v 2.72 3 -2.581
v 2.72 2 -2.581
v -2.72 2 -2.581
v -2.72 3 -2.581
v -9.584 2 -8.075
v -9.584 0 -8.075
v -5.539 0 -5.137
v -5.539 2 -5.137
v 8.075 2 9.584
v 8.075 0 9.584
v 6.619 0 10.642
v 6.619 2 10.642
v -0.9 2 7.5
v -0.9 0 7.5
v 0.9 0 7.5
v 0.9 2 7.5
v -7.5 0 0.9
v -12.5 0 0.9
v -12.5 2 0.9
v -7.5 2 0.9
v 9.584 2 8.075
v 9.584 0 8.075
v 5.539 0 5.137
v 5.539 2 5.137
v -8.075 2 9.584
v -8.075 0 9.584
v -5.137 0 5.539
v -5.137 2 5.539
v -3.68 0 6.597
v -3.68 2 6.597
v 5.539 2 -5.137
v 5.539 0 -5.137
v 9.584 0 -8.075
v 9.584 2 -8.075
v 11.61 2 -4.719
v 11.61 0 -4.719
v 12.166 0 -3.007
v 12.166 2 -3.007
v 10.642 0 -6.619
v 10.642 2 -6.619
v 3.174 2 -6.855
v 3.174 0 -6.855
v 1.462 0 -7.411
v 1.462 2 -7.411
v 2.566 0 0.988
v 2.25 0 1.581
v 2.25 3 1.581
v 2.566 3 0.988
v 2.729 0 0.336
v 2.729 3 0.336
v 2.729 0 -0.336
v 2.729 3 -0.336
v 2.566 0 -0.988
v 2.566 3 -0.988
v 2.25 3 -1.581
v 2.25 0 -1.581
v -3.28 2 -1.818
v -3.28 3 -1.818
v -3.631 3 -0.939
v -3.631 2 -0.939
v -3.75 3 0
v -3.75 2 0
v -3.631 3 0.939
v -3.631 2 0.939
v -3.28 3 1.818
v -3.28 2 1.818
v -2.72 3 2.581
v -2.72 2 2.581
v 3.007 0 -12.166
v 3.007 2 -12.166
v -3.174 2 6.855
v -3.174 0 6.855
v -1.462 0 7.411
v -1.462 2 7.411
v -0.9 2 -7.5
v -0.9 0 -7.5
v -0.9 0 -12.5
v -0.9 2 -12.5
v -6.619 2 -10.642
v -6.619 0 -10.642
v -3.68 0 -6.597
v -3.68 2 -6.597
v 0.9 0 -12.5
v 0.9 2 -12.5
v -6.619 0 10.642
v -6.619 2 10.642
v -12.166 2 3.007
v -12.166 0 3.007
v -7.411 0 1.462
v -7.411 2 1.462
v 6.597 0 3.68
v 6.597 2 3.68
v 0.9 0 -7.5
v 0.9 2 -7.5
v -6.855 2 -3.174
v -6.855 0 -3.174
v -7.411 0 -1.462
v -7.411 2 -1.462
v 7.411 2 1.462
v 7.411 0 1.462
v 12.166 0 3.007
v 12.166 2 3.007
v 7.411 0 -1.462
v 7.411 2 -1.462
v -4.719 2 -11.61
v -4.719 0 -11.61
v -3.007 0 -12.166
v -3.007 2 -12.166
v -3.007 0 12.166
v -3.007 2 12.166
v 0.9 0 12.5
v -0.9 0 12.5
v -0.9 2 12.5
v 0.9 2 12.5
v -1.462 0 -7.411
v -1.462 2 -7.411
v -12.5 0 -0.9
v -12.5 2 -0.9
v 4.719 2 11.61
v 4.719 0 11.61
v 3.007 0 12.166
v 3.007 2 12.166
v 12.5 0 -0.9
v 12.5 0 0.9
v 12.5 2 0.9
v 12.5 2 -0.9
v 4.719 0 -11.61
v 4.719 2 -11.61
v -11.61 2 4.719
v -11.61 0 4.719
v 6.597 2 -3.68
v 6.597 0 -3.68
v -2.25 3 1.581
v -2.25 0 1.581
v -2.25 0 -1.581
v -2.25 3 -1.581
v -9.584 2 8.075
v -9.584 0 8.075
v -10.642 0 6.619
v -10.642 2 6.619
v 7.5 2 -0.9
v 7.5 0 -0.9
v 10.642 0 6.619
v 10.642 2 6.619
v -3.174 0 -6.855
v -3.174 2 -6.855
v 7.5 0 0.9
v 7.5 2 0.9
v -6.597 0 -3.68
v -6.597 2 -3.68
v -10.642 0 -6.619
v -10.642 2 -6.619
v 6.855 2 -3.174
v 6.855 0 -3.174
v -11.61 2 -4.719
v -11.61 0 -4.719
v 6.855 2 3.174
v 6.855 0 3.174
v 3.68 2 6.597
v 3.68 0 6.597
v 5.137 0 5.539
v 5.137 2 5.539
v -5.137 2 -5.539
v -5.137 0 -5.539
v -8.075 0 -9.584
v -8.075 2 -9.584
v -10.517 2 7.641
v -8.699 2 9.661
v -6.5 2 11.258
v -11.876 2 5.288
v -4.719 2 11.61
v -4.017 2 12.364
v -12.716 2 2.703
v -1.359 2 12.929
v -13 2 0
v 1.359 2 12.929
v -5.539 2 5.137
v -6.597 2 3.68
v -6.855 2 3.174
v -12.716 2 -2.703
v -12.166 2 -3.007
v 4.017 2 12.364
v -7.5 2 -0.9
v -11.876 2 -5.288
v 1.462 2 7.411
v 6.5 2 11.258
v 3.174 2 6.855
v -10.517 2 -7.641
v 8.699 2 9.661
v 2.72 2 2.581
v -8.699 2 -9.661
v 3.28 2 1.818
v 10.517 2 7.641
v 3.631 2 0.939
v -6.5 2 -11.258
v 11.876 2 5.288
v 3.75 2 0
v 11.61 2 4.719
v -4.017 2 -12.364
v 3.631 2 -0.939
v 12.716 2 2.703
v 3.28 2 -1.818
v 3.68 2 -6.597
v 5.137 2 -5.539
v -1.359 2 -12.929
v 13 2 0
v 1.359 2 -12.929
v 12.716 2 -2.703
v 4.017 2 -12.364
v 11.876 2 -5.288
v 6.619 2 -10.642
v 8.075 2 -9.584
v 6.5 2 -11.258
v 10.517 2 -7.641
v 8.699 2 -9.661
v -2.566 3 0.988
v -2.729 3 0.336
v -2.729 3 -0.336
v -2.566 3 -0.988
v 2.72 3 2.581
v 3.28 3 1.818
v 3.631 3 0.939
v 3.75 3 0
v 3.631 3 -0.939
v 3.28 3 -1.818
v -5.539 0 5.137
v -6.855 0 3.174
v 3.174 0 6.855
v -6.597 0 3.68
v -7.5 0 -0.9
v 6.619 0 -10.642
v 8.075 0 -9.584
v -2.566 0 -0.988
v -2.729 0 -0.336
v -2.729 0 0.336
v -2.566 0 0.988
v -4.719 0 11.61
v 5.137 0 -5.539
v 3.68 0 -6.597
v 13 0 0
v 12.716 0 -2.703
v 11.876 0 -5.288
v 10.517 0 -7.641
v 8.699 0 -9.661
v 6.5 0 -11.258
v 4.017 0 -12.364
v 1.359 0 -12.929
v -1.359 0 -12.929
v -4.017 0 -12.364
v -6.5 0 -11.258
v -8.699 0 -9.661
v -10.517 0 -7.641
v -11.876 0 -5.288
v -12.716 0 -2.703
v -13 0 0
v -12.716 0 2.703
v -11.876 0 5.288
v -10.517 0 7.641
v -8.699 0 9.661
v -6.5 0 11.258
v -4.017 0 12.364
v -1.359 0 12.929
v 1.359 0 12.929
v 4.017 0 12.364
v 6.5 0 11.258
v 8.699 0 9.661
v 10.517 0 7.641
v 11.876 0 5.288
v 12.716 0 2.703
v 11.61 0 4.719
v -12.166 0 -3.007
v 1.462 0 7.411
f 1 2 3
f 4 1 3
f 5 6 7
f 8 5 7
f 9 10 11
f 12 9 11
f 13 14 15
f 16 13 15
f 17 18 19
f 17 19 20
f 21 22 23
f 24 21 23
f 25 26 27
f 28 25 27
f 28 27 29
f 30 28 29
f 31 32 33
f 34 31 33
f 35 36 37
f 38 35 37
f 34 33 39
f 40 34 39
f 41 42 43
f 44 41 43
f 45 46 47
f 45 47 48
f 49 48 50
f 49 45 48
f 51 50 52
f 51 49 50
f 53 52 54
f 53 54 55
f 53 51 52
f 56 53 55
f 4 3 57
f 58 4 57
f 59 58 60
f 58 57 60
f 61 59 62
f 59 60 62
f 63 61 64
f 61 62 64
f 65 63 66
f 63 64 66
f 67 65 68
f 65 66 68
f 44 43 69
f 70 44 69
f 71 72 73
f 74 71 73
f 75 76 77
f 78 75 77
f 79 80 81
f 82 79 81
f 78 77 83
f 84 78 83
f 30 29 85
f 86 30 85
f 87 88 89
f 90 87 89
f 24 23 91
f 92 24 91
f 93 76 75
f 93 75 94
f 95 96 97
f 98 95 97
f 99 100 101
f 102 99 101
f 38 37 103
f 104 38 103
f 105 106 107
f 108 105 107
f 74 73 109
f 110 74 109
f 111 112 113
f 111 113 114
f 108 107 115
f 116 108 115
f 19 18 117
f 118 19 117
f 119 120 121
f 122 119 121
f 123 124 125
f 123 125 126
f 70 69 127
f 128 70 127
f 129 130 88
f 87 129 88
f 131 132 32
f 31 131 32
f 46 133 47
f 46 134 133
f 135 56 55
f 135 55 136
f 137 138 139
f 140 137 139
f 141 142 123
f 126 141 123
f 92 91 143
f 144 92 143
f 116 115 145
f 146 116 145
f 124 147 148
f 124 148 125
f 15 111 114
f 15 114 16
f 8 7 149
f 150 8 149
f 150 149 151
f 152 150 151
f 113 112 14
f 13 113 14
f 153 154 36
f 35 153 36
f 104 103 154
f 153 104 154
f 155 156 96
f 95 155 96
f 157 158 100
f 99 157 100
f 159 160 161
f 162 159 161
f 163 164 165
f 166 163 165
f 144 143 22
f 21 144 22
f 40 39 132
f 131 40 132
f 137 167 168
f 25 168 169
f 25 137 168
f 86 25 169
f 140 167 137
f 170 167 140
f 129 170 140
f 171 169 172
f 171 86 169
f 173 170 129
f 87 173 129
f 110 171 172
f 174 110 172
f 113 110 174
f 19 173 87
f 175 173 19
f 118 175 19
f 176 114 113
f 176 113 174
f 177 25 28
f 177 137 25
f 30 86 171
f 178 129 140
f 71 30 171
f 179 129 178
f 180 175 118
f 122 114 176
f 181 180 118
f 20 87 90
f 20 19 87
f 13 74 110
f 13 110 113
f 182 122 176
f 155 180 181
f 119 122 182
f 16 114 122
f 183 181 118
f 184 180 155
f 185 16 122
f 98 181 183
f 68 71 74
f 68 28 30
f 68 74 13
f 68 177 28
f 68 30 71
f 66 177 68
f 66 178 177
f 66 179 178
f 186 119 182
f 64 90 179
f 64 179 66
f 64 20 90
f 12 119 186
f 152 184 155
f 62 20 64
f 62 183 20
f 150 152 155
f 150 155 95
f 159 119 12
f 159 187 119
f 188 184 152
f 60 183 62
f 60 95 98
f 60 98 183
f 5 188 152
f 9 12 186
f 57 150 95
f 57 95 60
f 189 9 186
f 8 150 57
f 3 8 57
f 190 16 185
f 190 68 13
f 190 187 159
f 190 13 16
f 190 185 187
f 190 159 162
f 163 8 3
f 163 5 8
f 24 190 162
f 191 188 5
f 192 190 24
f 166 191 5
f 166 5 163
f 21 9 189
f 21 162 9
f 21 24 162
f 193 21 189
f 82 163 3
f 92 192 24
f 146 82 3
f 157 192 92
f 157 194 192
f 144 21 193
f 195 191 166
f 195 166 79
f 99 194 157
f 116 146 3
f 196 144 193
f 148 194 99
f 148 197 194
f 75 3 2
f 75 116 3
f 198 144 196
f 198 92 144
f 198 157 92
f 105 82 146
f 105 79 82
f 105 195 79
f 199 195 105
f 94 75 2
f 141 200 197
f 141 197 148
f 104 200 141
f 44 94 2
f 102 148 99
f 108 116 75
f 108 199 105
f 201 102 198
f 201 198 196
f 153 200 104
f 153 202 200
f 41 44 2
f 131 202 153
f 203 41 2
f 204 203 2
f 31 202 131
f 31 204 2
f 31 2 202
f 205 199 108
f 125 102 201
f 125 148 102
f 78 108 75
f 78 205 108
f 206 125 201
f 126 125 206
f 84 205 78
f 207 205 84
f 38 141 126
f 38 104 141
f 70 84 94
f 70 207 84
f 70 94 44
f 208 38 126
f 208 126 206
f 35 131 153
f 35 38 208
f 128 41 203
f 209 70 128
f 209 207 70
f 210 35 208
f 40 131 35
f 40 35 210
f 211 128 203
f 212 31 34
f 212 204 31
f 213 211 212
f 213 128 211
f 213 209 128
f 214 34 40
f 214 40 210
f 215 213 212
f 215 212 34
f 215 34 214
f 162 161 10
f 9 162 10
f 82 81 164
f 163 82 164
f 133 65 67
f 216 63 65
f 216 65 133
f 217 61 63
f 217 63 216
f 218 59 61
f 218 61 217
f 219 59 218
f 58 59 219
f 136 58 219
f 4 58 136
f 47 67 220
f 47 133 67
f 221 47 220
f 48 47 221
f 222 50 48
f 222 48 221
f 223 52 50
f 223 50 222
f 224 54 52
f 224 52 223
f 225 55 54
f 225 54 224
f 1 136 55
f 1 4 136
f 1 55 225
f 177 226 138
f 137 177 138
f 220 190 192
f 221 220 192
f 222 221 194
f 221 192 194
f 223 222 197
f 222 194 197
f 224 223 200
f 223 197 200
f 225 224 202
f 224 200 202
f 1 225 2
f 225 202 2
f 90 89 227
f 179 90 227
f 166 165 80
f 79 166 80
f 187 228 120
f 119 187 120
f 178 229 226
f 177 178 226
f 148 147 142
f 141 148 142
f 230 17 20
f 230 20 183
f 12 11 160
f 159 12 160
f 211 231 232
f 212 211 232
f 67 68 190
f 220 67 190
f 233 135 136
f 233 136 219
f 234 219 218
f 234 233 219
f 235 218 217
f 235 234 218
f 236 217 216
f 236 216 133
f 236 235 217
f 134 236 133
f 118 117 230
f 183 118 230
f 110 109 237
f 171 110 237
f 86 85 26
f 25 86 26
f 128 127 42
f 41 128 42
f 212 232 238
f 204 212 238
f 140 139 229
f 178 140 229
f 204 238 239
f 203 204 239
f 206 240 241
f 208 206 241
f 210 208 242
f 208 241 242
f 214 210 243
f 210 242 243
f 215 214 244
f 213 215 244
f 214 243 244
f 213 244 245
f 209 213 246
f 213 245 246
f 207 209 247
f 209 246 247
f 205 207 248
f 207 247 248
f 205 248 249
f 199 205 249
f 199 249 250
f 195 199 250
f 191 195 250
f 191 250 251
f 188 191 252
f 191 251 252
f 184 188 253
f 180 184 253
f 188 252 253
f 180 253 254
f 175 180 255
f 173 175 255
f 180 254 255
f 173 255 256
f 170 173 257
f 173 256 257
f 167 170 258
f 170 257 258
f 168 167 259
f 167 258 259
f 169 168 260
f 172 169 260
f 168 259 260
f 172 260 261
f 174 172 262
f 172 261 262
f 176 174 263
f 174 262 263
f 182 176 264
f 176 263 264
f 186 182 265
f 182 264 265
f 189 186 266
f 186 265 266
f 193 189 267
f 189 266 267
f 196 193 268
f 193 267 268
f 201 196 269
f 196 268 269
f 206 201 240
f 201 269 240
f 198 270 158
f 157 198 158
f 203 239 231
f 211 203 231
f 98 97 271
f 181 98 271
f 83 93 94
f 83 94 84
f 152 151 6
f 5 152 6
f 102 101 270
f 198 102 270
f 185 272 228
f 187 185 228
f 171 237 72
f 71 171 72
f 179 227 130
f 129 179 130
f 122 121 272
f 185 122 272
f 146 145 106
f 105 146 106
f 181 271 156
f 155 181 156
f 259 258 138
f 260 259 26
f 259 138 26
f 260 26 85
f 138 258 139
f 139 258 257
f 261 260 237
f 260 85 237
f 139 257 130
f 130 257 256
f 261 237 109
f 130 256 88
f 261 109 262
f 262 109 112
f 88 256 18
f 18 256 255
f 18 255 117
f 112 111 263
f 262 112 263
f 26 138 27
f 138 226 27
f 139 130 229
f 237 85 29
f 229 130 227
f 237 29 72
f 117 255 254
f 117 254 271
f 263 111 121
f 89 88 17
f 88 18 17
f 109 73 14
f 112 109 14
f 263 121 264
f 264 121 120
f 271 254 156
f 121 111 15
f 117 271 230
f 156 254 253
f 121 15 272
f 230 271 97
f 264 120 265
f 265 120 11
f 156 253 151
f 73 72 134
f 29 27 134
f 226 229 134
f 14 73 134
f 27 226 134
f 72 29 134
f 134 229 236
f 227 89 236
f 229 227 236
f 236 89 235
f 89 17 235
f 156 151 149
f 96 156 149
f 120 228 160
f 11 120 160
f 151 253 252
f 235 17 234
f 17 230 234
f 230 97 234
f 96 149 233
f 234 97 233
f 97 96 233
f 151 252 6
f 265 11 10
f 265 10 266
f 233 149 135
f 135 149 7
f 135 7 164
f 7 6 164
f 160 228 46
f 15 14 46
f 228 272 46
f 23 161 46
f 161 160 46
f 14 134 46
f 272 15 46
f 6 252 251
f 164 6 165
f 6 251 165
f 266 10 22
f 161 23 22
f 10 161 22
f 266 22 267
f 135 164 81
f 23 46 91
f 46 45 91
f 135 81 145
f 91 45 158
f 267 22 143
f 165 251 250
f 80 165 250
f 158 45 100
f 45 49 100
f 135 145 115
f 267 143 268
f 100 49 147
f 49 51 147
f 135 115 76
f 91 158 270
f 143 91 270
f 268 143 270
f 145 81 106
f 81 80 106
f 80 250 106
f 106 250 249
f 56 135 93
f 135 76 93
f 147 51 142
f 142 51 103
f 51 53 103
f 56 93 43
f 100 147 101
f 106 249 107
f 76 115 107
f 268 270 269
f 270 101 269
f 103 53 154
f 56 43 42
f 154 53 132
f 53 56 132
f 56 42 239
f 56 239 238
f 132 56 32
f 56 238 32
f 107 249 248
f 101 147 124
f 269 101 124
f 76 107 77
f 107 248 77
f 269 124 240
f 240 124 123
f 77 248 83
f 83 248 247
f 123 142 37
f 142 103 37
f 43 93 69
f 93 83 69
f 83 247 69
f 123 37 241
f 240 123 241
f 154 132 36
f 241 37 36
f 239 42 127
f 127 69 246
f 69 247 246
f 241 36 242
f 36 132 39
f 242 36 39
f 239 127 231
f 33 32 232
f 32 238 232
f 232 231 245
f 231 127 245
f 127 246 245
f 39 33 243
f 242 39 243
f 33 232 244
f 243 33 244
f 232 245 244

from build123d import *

# Parameters (mm, degrees)
SKETCH1_R           = 13
SKETCH1_W           = 1.8
SKETCH1_H           = 5
SKETCH1_W_2         = 5
SKETCH1_H_2         = 1.8
BOSS_EXTRUDE1_DEPTH = 2
BOSS_EXTRUDE2_DEPTH = 1


with BuildPart() as part:
    # Sketch1 → Boss-Extrude1 (new body)
    with BuildSketch(Plane(origin=(0, 0, 0), x_dir=(1, 0, 0), z_dir=(0, 1, 0))):
        Circle(SKETCH1_R)
        with BuildLine():
            Line((-2.25, 1.58113883), (2.25, 1.58113883))
            ThreePointArc((2.25, 1.58113883), (2.75, 0), (2.25, -1.58113883))
            Line((2.25, -1.58113883), (-2.25, -1.58113883))
            ThreePointArc((-2.25, -1.58113883), (-2.75, 0), (-2.25, 1.58113883))
        make_face(mode=Mode.SUBTRACT)
        Polygon((1.461676593, 7.411039167), (3.006761565, 12.166321749), (4.718663294, 11.610091159), (3.173578322, 6.854808577), align=None, mode=Mode.SUBTRACT)
        with Locations((0, 10)):
            Rectangle(SKETCH1_W, SKETCH1_H, mode=Mode.SUBTRACT)
        Polygon((3.680274097, 6.596634185), (6.619200359, 10.641719157), (8.075430949, 9.583705703), (5.136504687, 5.538620731), align=None, mode=Mode.SUBTRACT)
        Polygon((5.538620731, 5.136504687), (9.583705703, 8.075430949), (10.641719157, 6.619200359), (6.596634185, 3.680274097), align=None, mode=Mode.SUBTRACT)
        Polygon((6.854808577, 3.173578322), (11.610091159, 4.718663294), (12.166321749, 3.006761565), (7.411039167, 1.461676593), align=None, mode=Mode.SUBTRACT)
        with Locations((10, 0)):
            Rectangle(SKETCH1_W_2, SKETCH1_H_2, mode=Mode.SUBTRACT)
        Polygon((7.411039167, -1.461676593), (12.166321749, -3.006761565), (11.610091159, -4.718663294), (6.854808577, -3.173578322), align=None, mode=Mode.SUBTRACT)
        Polygon((6.596634185, -3.680274097), (10.641719157, -6.619200359), (9.583705703, -8.075430949), (5.538620731, -5.136504687), align=None, mode=Mode.SUBTRACT)
        Polygon((5.136504687, -5.538620731), (8.075430949, -9.583705703), (6.619200359, -10.641719157), (3.680274097, -6.596634185), align=None, mode=Mode.SUBTRACT)
        Polygon((3.173578322, -6.854808577), (4.718663294, -11.610091159), (3.006761565, -12.166321749), (1.461676593, -7.411039167), align=None, mode=Mode.SUBTRACT)
        with Locations((0, -10)):
            Rectangle(SKETCH1_W, SKETCH1_H, mode=Mode.SUBTRACT)
        Polygon((-1.461676593, -7.411039167), (-3.006761565, -12.166321749), (-4.718663294, -11.610091159), (-3.173578322, -6.854808577), align=None, mode=Mode.SUBTRACT)
        Polygon((-3.680274097, -6.596634185), (-6.619200359, -10.641719157), (-8.075430949, -9.583705703), (-5.136504687, -5.538620731), align=None, mode=Mode.SUBTRACT)
        Polygon((-5.538620731, -5.136504687), (-9.583705703, -8.075430949), (-10.641719157, -6.619200359), (-6.596634185, -3.680274097), align=None, mode=Mode.SUBTRACT)
        Polygon((-6.854808577, -3.173578322), (-11.610091159, -4.718663294), (-12.166321749, -3.006761565), (-7.411039167, -1.461676593), align=None, mode=Mode.SUBTRACT)
        with Locations((-10, 0)):
            Rectangle(SKETCH1_W_2, SKETCH1_H_2, mode=Mode.SUBTRACT)
        Polygon((-7.411039167, 1.461676593), (-12.166321749, 3.006761565), (-11.610091159, 4.718663294), (-6.854808577, 3.173578322), align=None, mode=Mode.SUBTRACT)
        Polygon((-6.596634185, 3.680274097), (-10.641719157, 6.619200359), (-9.583705703, 8.075430949), (-5.538620731, 5.136504687), align=None, mode=Mode.SUBTRACT)
        Polygon((-5.136504687, 5.538620731), (-8.075430949, 9.583705703), (-6.619200359, 10.641719157), (-3.680274097, 6.596634185), align=None, mode=Mode.SUBTRACT)
        Polygon((-3.173578322, 6.854808577), (-4.718663294, 11.610091159), (-3.006761565, 12.166321749), (-1.461676593, 7.411039167), align=None, mode=Mode.SUBTRACT)
    extrude(amount=BOSS_EXTRUDE1_DEPTH)

    # Sketch2 → Boss-Extrude2 (add)
    with BuildSketch(Plane(origin=(0, 2, 0), x_dir=(1, 0, 0), z_dir=(0, 1, 0))):
        with BuildLine():
            Line((-2.720334968, -2.58113883), (2.720334968, -2.58113883))
            ThreePointArc((2.720334968, -2.58113883), (3.75, 0), (2.720334968, 2.58113883))
            Line((2.720334968, 2.58113883), (-2.720334968, 2.58113883))
            ThreePointArc((-2.720334968, 2.58113883), (-3.75, 0), (-2.720334968, -2.58113883))
        make_face()
        with BuildLine():
            Line((-2.25, -1.58113883), (2.25, -1.58113883))
            ThreePointArc((2.25, -1.58113883), (2.75, 0), (2.25, 1.58113883))
            Line((2.25, 1.58113883), (-2.25, 1.58113883))
            ThreePointArc((-2.25, 1.58113883), (-2.75, 0), (-2.25, -1.58113883))
        make_face(mode=Mode.SUBTRACT)
    extrude(amount=BOSS_EXTRUDE2_DEPTH)


solid = part.part
